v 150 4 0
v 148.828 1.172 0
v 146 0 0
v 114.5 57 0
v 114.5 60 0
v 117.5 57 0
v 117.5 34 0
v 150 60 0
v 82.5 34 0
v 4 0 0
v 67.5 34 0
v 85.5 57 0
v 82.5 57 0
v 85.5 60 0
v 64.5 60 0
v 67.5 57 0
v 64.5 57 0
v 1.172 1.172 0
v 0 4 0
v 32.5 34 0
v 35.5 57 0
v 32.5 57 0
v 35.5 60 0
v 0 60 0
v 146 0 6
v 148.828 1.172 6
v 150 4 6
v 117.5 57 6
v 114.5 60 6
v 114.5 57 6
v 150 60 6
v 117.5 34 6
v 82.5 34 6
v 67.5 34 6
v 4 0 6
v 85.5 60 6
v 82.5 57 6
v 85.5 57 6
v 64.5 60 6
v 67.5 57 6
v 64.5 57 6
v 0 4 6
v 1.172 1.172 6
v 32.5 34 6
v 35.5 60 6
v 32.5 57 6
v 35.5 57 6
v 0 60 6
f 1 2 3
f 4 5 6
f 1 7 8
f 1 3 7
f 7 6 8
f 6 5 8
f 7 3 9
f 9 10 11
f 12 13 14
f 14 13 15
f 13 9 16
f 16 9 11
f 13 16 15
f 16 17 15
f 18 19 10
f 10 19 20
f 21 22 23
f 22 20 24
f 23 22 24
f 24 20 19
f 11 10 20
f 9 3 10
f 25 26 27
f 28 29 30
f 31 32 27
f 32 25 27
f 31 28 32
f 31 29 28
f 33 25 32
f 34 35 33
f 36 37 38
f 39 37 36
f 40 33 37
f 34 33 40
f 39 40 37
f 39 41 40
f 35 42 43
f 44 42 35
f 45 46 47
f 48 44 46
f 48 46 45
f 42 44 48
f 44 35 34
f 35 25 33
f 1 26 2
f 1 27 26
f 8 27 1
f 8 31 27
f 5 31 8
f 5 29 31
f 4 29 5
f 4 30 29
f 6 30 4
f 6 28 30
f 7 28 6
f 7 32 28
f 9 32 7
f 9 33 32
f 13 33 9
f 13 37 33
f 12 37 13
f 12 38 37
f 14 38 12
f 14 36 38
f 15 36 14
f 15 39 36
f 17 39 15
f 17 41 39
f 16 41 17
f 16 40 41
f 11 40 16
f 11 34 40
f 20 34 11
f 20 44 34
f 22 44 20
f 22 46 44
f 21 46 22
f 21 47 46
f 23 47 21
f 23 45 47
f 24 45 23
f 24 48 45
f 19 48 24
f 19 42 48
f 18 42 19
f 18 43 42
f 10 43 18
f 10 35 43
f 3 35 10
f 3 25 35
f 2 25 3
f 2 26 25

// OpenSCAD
$fn = 32;

// ----------------------------------------------------------------------
// Oversize slot bar: 150 mm bar with 2 oversize windows
// ----------------------------------------------------------------------

// --- parameters (mm) ---
profile_height = 6;       // extrusion height
profile_points = 24;      // points of the closed outline

profile = [[0, 4], [1.172, 1.172], [4, 0], [146, 0], [148.828, 1.172], [150, 4], [150, 60], [114.5, 60], [114.5, 57], [117.5, 57], [117.5, 34], [82.5, 34], [82.5, 57], [85.5, 57], [85.5, 60], [64.5, 60], [64.5, 57], [67.5, 57], [67.5, 34], [32.5, 34], [32.5, 57], [35.5, 57], [35.5, 60], [0, 60]];  // single closed polygon, 24 points, counter clockwise

// --- the one profile operation ---
linear_extrude(height = profile_height) polygon(points = profile);
